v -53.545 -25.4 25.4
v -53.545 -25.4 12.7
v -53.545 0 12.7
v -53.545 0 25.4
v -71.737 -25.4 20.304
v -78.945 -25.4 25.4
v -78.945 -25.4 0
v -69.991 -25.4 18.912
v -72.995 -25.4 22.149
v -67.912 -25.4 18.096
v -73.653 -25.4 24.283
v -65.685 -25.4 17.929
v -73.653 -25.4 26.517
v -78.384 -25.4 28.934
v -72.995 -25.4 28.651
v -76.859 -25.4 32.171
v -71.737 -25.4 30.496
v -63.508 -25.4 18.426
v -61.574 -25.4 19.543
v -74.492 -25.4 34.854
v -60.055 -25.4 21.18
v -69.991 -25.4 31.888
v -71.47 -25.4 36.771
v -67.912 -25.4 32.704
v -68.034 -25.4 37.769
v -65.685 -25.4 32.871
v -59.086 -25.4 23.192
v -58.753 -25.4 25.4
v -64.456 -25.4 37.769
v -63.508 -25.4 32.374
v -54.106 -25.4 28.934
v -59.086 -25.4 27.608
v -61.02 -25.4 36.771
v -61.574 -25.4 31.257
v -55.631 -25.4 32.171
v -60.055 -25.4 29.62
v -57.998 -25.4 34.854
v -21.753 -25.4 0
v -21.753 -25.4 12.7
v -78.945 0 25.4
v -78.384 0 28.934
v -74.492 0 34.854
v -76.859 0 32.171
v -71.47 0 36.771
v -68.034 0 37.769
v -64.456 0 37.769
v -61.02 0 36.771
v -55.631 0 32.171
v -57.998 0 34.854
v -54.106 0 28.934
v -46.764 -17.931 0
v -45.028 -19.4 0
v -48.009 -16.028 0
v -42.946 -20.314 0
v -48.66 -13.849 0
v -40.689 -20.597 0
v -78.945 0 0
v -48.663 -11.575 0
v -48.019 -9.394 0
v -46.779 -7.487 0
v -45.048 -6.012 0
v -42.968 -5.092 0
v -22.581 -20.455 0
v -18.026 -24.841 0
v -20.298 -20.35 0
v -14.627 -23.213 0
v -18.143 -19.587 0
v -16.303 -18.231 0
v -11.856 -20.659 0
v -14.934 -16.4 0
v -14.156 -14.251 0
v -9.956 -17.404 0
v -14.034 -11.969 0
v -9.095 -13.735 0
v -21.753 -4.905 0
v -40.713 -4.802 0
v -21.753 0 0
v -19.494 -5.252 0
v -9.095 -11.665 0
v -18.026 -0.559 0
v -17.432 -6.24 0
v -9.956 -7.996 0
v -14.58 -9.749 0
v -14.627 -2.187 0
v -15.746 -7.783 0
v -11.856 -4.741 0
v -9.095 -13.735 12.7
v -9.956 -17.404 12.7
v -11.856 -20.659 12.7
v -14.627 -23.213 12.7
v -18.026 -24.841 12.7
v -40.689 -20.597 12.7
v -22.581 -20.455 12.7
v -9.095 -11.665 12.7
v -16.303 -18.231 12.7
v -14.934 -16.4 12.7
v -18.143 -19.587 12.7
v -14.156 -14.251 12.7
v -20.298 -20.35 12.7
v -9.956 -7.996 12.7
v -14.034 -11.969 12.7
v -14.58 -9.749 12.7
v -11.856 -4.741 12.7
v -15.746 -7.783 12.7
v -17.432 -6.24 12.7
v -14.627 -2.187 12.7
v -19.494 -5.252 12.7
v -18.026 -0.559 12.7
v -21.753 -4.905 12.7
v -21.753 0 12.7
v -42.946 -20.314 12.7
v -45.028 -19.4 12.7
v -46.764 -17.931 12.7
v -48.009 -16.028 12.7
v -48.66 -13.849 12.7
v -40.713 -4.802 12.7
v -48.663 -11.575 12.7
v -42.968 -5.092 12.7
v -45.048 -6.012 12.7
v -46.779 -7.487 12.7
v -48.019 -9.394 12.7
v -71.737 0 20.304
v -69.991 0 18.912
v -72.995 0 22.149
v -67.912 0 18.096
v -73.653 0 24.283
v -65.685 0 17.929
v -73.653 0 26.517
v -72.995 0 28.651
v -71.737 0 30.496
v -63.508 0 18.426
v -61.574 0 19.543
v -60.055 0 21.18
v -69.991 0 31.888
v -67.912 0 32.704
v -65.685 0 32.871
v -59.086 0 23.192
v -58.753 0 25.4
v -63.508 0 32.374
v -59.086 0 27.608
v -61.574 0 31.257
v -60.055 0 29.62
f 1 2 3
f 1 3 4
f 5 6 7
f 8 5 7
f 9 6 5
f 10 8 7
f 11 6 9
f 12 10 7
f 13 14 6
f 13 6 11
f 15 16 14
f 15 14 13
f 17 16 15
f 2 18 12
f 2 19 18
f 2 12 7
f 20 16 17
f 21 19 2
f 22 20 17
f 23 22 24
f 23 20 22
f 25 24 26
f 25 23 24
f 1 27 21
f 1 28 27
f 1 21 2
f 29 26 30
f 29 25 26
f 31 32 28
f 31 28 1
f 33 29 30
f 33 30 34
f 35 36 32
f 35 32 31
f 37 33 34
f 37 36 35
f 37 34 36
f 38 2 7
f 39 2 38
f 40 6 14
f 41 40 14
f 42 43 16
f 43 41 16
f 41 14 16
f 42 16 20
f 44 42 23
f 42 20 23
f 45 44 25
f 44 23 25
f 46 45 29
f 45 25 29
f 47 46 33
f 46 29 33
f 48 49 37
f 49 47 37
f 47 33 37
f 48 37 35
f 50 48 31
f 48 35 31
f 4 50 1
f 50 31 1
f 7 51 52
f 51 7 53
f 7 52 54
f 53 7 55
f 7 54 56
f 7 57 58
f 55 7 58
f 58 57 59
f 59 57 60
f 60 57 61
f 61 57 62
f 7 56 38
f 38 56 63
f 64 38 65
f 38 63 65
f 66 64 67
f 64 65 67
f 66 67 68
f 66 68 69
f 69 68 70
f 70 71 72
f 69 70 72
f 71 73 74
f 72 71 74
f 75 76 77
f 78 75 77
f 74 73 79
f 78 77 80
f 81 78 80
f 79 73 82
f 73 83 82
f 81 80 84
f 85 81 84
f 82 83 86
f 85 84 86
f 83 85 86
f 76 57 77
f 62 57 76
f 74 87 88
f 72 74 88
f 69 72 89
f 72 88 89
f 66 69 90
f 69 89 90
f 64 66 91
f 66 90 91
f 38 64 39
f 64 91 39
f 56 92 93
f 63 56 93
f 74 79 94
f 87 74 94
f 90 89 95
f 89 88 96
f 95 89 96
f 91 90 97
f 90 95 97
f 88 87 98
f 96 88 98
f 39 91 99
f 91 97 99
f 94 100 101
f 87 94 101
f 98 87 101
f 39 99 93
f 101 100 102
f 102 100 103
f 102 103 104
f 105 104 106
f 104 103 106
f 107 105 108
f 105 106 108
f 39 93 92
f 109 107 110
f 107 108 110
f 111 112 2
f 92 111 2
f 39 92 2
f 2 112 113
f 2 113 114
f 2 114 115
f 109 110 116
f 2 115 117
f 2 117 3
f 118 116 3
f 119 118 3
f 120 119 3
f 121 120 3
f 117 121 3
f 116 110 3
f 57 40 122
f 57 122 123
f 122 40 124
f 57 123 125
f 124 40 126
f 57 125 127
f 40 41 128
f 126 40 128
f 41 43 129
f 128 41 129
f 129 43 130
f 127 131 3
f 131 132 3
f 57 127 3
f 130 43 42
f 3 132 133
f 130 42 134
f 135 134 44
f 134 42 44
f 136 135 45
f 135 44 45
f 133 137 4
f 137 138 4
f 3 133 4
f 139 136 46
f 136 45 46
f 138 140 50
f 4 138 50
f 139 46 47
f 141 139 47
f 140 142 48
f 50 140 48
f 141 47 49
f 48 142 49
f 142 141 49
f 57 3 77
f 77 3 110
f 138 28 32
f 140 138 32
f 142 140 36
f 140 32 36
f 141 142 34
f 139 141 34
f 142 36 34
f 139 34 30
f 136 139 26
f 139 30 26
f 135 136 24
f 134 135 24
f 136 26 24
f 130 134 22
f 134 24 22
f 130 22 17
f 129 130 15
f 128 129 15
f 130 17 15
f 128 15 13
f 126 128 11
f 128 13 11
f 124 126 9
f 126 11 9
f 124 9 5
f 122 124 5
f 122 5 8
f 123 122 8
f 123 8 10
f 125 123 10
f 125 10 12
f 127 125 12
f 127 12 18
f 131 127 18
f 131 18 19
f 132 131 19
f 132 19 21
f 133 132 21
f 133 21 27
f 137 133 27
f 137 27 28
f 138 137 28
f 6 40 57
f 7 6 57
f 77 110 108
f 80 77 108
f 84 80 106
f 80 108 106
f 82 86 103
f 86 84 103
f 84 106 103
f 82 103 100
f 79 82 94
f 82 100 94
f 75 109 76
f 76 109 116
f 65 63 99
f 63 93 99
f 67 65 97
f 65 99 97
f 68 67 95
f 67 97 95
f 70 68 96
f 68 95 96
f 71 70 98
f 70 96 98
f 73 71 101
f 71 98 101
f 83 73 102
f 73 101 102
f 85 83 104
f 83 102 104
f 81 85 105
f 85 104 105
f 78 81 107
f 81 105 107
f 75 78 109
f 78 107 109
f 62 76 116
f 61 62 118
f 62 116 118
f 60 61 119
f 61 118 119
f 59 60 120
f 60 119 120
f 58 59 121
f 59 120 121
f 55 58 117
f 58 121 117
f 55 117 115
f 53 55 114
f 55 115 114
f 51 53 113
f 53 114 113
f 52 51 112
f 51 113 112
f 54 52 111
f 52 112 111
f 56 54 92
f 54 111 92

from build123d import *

# Parameters (mm, degrees)
F1_DEPTH  = 25.4
F2_R      = 7.491958629
F3_DEPTH  = 25.401
F5_DEPTH  = 25.401
F6_R      = 7.8989022762
F6_R_2    = 7.7951690208
F7_DEPTH  = 12.701
F9_DEPTH  = 12.701
F11_DEPTH = 12.701


with BuildPart() as f1:
    # F0 (on Front) → F1 (new body)
    with BuildSketch(Plane.XZ):
        Polygon((-53.5450525341, 38.1), (-78.9450525341, 38.1), (-78.9450525341, 0), (-9.0950525341, 0), (-9.0950525341, 12.7), (-53.5450525341, 12.7), align=None)
    extrude(amount=F1_DEPTH)

    # F2 (on face) → F3 (cut, through all)
    with BuildSketch(Plane.XZ.offset(25.4)):
        with Locations((-66.2450525341, 25.4)):
            Circle(F2_R)
    extrude(amount=-F3_DEPTH, mode=Mode.SUBTRACT)

    # F4 (on face) → F5 (cut, through all)
    with BuildSketch(Plane.XZ.offset(25.4)):
        with BuildLine():
            ThreePointArc((-78.9450525341, 25.4), (-66.2450525341, 37.895691554), (-53.5450525341, 25.4))
            Line((-53.5450525341, 25.4), (-53.5450525341, 38.1))
            Line((-53.5450525341, 38.1), (-78.9450525341, 38.1))
            Line((-78.9450525341, 38.1), (-78.9450525341, 25.4))
        make_face()
    extrude(amount=-F5_DEPTH, mode=Mode.SUBTRACT)

    # F6 (on face) → F7 (cut, through all)
    with BuildSketch(Plane.XY.offset(12.7)):
        with Locations((-40.8450525341, -12.7)):
            Circle(F6_R)
        with Locations((-21.7950525341, -12.7)):
            Circle(F6_R_2)
    extrude(amount=-F7_DEPTH, mode=Mode.SUBTRACT)

    # F8 (on face) → F9 (cut, through all)
    with BuildSketch(Plane.XY.offset(12.7)):
        with BuildLine():
            ThreePointArc((-32.9461502579, -12.7), (-35.204801221, -18.2299387243), (-40.6890545818, -20.5973616992))
            Line((-40.6890545818, -20.5973616992), (-22.5810122533, -20.4554450151))
            ThreePointArc((-22.5810122533, -20.4554450151), (-29.5791895595, -12.2854269284), (-21.7528127547, -4.9049454227))
            Line((-21.7528127547, -4.9049454227), (-40.7127795229, -4.8022053066))
            ThreePointArc((-40.7127795229, -4.8022053066), (-35.2131137579, -7.1615956459), (-32.9461502579, -12.7))
        make_face()
    extrude(amount=-F9_DEPTH, mode=Mode.SUBTRACT)

    # F10 (on face) → F11 (cut, through all)
    with BuildSketch(Plane.XY.offset(12.7)):
        with BuildLine():
            ThreePointArc((-21.7528127547, 0), (-13.1462388454, -3.3610018984), (-9.0950525341, -11.6650573949))
            Line((-9.0950525341, -11.6650573949), (-9.0950525341, 0))
            Line((-9.0950525341, 0), (-21.7528127547, 0))
        make_face()
        with BuildLine():
            ThreePointArc((-9.0950525341, -13.7349426051), (-13.1462388454, -22.0389981016), (-21.7528127547, -25.4))
            Line((-21.7528127547, -25.4), (-9.0950525341, -25.4))
            Line((-9.0950525341, -25.4), (-9.0950525341, -13.7349426051))
        make_face()
    extrude(amount=-F11_DEPTH, mode=Mode.SUBTRACT)


solid = f1.part
